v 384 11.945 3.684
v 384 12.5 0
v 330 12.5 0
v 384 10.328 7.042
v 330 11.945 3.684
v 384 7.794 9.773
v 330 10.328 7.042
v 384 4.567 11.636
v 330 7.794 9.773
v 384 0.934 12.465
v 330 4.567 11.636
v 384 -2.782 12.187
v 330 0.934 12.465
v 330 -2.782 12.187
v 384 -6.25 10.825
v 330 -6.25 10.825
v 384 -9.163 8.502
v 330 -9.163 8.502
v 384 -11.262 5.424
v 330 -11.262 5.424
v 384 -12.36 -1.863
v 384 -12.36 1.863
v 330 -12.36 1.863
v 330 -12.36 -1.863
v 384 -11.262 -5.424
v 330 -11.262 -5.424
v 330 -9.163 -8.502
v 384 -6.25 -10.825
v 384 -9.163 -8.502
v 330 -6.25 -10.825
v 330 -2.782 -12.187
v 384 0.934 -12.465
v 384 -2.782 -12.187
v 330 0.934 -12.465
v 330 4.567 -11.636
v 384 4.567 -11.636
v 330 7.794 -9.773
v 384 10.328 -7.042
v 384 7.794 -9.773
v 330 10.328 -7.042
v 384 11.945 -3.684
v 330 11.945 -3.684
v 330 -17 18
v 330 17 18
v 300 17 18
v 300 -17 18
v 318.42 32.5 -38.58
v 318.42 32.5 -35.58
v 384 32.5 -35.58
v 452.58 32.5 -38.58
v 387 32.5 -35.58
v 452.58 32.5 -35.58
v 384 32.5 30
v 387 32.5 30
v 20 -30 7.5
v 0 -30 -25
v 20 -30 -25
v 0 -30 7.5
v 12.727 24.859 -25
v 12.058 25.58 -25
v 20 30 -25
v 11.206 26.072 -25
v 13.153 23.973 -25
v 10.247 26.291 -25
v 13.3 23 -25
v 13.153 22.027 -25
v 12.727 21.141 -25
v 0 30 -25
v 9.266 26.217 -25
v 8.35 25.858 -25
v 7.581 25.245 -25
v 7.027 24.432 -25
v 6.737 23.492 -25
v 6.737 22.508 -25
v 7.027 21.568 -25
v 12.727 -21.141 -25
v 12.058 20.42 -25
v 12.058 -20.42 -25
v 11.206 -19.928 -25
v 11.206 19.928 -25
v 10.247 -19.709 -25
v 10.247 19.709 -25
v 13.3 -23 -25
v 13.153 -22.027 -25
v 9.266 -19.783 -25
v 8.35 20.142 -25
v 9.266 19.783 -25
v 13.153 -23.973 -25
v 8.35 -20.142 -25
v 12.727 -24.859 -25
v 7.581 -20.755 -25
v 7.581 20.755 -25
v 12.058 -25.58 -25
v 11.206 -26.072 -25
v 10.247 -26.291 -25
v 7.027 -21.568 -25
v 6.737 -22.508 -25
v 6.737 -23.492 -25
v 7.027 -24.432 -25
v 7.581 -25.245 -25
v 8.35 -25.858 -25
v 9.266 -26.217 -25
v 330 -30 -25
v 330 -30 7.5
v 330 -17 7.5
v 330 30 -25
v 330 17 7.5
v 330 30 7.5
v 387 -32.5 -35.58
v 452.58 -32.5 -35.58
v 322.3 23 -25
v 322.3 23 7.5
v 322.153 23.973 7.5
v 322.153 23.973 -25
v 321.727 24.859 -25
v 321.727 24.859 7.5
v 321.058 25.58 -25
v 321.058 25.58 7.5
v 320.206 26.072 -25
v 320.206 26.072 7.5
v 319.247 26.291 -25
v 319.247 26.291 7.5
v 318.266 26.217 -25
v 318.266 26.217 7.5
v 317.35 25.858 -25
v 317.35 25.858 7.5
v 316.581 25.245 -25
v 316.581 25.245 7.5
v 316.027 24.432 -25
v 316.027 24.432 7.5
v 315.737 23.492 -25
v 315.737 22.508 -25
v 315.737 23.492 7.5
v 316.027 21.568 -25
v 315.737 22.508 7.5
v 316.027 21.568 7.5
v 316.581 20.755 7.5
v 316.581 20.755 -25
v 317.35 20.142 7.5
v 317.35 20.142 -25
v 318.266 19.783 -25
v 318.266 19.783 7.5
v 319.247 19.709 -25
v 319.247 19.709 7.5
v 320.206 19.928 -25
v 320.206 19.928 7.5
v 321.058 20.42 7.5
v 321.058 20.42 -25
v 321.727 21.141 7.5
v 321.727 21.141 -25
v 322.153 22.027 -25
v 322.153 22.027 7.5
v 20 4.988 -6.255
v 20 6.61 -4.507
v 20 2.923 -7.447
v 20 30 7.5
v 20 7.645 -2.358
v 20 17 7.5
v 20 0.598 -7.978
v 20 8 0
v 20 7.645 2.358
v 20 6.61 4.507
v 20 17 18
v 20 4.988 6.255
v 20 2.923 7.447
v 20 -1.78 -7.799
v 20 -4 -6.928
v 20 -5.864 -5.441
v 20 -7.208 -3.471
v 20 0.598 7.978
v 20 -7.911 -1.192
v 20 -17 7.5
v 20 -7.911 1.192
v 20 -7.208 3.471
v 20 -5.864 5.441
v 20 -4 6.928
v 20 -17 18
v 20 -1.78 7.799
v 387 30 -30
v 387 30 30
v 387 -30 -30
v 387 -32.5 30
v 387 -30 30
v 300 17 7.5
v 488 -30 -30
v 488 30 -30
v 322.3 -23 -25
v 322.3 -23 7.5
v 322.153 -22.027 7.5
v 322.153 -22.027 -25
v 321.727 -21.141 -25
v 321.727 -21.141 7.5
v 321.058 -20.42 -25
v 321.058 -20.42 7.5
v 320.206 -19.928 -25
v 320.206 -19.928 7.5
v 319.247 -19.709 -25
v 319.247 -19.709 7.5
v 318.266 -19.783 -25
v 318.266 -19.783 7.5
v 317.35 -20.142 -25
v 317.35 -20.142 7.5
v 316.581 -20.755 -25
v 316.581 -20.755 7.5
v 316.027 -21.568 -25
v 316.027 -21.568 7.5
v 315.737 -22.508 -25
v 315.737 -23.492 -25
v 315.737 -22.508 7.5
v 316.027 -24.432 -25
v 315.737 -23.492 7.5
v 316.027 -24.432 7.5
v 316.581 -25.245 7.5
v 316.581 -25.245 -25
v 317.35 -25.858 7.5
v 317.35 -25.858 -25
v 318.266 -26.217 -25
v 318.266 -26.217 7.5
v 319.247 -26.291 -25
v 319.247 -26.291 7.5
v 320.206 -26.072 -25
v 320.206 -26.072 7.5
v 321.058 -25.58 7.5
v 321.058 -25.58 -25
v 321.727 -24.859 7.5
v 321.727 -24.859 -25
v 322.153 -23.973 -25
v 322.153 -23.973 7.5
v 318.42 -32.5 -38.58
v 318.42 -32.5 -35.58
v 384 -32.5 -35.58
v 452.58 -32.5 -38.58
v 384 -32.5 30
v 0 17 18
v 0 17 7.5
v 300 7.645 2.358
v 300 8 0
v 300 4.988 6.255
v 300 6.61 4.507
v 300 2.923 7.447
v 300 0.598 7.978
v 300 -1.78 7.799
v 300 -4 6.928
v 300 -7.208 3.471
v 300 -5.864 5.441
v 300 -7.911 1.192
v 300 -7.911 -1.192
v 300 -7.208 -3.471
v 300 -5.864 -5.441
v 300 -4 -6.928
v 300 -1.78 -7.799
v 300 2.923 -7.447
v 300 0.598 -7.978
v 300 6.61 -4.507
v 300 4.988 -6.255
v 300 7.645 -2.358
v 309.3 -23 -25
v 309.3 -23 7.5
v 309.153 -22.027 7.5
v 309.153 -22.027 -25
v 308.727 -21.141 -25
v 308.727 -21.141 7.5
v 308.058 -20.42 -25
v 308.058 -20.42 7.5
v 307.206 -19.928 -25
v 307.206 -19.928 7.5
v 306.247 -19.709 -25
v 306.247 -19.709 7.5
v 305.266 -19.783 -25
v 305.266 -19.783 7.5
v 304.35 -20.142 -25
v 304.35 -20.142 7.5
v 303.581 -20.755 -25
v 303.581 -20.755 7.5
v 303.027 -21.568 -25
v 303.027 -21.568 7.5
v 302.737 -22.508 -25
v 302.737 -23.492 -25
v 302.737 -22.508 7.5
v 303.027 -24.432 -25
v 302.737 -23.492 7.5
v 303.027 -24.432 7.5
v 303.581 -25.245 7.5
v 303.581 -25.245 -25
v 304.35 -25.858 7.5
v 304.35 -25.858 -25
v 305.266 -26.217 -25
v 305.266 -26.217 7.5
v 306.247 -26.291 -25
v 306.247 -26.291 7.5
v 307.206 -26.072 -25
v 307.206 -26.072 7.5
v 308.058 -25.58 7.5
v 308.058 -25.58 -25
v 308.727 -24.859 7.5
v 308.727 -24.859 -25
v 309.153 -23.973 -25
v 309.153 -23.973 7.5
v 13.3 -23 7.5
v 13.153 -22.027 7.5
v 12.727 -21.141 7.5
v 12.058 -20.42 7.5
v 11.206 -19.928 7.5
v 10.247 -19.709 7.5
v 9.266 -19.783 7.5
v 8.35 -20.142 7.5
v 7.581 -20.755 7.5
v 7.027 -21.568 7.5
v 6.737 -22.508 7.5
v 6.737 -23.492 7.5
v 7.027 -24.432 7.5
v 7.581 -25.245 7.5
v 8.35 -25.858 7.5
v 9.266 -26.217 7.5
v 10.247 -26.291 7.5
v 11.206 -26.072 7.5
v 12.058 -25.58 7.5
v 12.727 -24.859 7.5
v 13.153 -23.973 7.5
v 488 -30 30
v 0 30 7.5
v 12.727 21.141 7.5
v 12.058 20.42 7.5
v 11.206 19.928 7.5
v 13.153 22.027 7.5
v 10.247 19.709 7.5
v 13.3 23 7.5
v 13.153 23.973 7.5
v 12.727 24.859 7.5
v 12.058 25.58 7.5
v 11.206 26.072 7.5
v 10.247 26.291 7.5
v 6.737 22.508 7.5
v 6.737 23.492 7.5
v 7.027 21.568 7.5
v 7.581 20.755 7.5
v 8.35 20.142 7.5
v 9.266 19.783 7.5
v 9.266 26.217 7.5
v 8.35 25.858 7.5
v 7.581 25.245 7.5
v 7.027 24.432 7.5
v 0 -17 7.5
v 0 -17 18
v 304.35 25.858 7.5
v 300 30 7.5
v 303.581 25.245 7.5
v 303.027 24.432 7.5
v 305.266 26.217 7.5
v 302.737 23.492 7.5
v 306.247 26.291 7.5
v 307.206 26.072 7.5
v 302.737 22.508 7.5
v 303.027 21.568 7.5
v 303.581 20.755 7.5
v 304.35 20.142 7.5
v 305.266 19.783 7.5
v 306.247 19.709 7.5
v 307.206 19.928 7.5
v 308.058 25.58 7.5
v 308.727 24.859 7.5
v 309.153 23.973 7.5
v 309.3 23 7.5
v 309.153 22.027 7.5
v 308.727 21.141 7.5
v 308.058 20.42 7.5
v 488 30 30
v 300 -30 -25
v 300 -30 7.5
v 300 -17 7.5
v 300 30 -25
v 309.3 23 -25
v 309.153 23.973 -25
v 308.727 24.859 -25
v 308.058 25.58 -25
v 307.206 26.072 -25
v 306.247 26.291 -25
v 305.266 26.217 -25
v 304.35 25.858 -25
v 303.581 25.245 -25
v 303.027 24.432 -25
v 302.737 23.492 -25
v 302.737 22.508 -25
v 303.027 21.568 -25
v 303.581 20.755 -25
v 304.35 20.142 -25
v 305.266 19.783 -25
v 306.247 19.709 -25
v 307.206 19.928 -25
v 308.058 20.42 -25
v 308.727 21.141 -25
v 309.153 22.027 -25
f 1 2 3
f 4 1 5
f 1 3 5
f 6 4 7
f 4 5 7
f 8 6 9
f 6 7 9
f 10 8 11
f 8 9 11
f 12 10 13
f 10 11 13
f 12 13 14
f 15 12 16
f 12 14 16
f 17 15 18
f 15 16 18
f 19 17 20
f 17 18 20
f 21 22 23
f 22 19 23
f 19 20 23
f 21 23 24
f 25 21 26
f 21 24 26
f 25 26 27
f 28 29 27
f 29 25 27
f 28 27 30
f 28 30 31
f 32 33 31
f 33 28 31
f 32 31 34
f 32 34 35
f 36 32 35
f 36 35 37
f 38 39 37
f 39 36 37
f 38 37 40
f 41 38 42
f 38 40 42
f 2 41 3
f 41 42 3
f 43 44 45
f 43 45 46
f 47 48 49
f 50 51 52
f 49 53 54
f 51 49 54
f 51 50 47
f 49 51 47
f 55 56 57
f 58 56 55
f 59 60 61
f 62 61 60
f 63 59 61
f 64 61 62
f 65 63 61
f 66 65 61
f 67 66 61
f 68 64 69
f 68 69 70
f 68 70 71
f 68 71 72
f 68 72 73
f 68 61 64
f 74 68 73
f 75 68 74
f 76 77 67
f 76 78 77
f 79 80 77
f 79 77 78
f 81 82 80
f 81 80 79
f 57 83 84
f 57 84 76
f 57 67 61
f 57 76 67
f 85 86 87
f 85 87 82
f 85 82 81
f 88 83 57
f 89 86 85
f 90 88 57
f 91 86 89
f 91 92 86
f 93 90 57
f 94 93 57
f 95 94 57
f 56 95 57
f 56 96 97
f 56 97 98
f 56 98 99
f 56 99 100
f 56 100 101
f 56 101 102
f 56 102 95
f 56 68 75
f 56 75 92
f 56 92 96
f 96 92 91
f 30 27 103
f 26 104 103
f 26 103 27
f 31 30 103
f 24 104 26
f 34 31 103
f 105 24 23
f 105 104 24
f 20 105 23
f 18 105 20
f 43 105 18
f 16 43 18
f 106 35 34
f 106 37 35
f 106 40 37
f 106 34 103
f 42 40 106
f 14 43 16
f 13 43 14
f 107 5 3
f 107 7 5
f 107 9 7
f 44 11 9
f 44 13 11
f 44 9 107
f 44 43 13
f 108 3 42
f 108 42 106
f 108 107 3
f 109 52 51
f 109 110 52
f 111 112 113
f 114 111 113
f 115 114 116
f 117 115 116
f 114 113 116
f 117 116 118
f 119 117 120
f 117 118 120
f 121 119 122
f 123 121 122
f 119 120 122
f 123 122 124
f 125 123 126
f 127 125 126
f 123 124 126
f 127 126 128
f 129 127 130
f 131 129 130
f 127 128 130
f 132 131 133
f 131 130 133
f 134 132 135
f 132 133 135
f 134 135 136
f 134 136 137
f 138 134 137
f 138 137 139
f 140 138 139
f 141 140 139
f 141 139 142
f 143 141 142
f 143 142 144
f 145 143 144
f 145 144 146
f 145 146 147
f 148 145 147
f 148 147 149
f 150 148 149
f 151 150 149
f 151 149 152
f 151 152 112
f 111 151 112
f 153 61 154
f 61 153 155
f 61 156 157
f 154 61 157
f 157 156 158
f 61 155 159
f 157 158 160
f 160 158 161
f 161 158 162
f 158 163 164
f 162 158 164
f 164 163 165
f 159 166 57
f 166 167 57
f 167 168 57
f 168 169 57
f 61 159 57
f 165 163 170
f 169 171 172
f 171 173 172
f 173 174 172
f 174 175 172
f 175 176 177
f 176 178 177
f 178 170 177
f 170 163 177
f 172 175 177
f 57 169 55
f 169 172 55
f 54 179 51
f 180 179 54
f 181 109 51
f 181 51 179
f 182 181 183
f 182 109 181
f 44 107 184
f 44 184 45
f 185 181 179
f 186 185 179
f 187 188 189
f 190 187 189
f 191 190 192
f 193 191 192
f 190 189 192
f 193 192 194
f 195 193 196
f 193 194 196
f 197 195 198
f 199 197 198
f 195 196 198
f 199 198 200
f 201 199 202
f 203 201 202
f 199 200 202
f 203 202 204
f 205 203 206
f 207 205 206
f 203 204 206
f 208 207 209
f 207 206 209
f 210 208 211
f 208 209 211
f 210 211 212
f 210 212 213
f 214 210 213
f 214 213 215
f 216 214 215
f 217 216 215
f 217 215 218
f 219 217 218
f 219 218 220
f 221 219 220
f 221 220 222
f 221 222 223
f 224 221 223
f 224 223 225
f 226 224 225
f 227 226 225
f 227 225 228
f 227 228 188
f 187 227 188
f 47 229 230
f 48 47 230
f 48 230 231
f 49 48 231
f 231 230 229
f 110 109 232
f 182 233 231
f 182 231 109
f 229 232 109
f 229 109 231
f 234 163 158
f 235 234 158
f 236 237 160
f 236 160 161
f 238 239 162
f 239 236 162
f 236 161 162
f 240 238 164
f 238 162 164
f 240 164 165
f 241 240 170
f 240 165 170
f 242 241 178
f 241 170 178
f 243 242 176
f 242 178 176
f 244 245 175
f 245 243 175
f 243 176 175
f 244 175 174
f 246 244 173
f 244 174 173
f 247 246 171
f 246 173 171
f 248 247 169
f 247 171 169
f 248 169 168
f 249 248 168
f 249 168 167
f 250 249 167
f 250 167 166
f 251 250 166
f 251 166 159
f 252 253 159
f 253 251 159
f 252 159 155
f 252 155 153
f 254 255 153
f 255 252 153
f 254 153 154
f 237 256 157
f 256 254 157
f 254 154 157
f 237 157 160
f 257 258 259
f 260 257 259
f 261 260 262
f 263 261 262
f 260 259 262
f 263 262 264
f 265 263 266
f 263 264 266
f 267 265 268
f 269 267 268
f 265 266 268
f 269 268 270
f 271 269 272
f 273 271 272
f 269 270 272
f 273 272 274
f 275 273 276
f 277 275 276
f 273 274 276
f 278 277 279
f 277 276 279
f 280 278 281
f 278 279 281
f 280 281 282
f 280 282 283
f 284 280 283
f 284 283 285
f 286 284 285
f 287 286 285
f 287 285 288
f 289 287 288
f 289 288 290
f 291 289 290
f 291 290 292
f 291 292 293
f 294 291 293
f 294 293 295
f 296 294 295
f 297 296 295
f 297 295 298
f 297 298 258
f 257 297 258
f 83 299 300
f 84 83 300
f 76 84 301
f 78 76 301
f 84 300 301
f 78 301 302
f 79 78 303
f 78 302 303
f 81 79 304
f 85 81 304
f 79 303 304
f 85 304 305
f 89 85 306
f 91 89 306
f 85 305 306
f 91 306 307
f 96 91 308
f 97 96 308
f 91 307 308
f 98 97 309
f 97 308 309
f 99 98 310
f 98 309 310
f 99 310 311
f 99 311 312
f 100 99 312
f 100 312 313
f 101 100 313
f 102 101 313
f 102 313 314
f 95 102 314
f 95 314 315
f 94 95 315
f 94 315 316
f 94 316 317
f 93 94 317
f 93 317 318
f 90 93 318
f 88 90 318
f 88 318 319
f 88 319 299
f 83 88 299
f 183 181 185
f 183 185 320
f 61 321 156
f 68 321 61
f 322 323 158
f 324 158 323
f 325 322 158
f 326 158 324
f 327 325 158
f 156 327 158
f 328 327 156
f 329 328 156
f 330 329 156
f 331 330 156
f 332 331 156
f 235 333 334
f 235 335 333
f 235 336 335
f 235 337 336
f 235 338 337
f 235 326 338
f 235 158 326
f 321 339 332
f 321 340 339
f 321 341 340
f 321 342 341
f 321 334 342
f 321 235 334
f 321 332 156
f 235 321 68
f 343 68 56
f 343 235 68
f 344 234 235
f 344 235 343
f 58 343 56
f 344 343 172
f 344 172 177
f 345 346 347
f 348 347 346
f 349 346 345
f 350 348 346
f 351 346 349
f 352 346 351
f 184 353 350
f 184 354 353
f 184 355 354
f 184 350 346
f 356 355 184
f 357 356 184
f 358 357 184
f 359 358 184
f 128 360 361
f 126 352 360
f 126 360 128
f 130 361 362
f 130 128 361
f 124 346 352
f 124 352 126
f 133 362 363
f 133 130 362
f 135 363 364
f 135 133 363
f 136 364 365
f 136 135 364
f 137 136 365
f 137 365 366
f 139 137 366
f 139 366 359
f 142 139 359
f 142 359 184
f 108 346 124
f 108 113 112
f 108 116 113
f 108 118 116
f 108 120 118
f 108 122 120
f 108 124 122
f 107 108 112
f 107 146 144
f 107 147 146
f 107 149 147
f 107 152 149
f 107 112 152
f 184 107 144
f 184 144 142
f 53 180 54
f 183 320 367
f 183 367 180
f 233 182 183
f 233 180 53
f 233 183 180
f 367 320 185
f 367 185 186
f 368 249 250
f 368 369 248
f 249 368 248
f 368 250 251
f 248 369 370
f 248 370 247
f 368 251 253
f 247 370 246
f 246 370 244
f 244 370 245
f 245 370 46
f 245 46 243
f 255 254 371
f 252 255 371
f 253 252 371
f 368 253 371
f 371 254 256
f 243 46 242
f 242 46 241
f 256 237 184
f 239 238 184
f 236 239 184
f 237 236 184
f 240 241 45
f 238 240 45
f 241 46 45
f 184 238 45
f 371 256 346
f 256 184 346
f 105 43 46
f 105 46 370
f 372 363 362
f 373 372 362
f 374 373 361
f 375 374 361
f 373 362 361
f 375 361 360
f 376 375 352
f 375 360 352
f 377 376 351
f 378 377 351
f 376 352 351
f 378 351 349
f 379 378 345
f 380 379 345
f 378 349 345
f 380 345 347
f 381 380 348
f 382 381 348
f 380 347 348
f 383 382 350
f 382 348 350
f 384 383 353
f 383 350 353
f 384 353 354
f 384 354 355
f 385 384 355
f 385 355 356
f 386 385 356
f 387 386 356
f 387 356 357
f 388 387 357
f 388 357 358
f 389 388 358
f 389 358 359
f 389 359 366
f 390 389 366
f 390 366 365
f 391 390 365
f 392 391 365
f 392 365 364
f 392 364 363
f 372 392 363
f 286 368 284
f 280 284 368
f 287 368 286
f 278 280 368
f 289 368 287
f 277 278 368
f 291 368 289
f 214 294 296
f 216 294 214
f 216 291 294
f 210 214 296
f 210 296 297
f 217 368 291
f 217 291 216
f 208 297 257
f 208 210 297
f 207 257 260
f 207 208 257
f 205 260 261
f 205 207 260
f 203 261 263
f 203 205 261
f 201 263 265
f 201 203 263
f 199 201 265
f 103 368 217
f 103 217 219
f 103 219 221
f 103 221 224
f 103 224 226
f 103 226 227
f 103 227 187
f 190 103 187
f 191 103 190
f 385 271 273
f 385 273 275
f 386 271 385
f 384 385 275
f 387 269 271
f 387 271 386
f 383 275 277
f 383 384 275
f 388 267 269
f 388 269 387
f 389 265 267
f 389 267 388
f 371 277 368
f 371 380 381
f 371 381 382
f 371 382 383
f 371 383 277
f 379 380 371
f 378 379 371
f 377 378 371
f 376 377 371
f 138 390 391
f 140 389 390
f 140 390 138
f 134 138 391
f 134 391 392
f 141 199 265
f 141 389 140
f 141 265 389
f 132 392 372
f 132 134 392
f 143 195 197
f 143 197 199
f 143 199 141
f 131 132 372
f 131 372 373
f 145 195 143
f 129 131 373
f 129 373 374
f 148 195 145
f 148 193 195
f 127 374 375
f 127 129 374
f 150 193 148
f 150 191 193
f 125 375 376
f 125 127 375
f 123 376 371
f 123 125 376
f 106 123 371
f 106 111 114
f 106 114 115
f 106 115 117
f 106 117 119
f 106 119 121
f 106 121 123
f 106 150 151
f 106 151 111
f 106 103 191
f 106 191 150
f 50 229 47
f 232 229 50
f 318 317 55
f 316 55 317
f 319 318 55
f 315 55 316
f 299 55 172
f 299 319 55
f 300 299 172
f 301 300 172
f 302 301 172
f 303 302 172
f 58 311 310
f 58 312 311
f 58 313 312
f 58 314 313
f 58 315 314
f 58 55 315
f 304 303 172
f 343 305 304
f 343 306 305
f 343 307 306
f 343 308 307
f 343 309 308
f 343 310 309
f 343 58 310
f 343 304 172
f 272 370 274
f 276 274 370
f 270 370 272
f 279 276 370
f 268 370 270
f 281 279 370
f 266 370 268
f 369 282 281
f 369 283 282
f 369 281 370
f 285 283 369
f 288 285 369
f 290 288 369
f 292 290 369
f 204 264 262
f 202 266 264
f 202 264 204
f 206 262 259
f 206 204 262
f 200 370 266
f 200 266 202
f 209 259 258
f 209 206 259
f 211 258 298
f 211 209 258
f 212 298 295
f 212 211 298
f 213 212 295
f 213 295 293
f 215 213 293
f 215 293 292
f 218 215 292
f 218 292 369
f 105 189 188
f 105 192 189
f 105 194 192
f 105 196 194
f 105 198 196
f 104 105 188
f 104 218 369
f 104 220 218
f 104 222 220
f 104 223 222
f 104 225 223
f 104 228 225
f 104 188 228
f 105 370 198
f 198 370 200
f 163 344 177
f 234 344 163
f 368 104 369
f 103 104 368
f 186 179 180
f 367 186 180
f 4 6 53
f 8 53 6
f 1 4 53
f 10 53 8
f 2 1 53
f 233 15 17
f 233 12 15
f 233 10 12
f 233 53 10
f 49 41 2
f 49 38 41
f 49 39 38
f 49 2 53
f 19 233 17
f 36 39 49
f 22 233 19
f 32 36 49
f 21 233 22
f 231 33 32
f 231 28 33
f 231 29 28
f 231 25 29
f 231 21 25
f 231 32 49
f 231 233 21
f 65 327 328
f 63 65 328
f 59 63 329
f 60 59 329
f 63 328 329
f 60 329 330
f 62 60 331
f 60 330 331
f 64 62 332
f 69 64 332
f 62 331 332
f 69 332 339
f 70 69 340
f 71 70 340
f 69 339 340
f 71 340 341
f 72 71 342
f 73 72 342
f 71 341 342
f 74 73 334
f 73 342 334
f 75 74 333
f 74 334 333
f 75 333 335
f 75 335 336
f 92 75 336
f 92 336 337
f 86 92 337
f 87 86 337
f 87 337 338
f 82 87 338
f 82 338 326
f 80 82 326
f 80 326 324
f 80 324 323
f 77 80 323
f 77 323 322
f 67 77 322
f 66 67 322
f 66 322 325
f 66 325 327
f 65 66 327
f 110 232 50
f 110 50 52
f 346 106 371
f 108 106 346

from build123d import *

# Parameters (mm, degrees)
F0_R      = 8
F1_DEPTH  = 330
F3_DEPTH  = 30
F5_DEPTH  = 20
F6_R      = 12.5
F7_DEPTH  = 57
F8_R      = 3.3
F9_DEPTH  = 43.001
F10_W     = 60
F10_H     = 60
F11_DEPTH = 101
F13_DEPTH = 32.5
F14_W     = 65.58
F14_H     = 3
F15_DEPTH = 65


# Not quite as in the source:
# - a feature names something its author has since deleted; it is built from what else it names


with BuildPart() as f1:
    # F0 (on Right) → F1 (new body)
    with BuildSketch(Plane.YZ):
        Circle(F0_R)
    extrude(amount=F1_DEPTH)

    # F2 (on face) → F3 (join)
    with BuildSketch(Plane.YZ.offset(330)):
        Polygon((30, 7.5), (17, 7.5), (17, 18), (-17, 18), (-17, 7.5), (-30, 7.5), (-30, -25), (30, -25), align=None)
    extrude(amount=-F3_DEPTH)

    # F4 (on face) → F5 (join)
    with BuildSketch(Plane(origin=(0, 0, 0), x_dir=(0, -1, 0), z_dir=(-1, 0, 0))):
        Polygon((17, 7.5), (17, 18), (-17, 18), (-17, 7.5), (-30, 7.5), (-30, -25), (30, -25), (30, 7.5), align=None)
    extrude(amount=-F5_DEPTH)

    # F6 (on face) → F7 (join)
    with BuildSketch(Plane.YZ.offset(330)):
        Circle(F6_R)
    extrude(amount=F7_DEPTH)

    # F8 (on face) → F9 (cut, through all)
    with BuildSketch(Plane.XY.offset(18)):
        with Locations((306, 23)):
            Circle(F8_R)
        with Locations((319, 23)):
            Circle(F8_R)
        with Locations((306, -23)):
            Circle(F8_R)
        with Locations((319, -23)):
            Circle(F8_R)
        with Locations((10, 23)):
            Circle(F8_R)
        with Locations((10, -23)):
            Circle(F8_R)
    extrude(amount=-F9_DEPTH, mode=Mode.SUBTRACT)

    # F10 (on face) → F11 (join)
    with BuildSketch(Plane.YZ.offset(387)):
        Rectangle(F10_W, F10_H)
    extrude(amount=F11_DEPTH)

    # F12 (on Front) → F13 (join, symmetric)
    with BuildSketch(Plane.XZ):
        Polygon((387, 30), (384, 30), (384, -38.58), (452.58, -38.58), (452.58, -35.58), (387, -35.58), align=None)
    extrude(amount=F13_DEPTH, both=True)

    # F14 (on face) → F15 (join, through all)
    with BuildSketch(Plane.XZ.offset(32.5)):
        with Locations((351.21, -37.08)):
            Rectangle(F14_W, F14_H)
    extrude(amount=-F15_DEPTH)


solid = f1.part
